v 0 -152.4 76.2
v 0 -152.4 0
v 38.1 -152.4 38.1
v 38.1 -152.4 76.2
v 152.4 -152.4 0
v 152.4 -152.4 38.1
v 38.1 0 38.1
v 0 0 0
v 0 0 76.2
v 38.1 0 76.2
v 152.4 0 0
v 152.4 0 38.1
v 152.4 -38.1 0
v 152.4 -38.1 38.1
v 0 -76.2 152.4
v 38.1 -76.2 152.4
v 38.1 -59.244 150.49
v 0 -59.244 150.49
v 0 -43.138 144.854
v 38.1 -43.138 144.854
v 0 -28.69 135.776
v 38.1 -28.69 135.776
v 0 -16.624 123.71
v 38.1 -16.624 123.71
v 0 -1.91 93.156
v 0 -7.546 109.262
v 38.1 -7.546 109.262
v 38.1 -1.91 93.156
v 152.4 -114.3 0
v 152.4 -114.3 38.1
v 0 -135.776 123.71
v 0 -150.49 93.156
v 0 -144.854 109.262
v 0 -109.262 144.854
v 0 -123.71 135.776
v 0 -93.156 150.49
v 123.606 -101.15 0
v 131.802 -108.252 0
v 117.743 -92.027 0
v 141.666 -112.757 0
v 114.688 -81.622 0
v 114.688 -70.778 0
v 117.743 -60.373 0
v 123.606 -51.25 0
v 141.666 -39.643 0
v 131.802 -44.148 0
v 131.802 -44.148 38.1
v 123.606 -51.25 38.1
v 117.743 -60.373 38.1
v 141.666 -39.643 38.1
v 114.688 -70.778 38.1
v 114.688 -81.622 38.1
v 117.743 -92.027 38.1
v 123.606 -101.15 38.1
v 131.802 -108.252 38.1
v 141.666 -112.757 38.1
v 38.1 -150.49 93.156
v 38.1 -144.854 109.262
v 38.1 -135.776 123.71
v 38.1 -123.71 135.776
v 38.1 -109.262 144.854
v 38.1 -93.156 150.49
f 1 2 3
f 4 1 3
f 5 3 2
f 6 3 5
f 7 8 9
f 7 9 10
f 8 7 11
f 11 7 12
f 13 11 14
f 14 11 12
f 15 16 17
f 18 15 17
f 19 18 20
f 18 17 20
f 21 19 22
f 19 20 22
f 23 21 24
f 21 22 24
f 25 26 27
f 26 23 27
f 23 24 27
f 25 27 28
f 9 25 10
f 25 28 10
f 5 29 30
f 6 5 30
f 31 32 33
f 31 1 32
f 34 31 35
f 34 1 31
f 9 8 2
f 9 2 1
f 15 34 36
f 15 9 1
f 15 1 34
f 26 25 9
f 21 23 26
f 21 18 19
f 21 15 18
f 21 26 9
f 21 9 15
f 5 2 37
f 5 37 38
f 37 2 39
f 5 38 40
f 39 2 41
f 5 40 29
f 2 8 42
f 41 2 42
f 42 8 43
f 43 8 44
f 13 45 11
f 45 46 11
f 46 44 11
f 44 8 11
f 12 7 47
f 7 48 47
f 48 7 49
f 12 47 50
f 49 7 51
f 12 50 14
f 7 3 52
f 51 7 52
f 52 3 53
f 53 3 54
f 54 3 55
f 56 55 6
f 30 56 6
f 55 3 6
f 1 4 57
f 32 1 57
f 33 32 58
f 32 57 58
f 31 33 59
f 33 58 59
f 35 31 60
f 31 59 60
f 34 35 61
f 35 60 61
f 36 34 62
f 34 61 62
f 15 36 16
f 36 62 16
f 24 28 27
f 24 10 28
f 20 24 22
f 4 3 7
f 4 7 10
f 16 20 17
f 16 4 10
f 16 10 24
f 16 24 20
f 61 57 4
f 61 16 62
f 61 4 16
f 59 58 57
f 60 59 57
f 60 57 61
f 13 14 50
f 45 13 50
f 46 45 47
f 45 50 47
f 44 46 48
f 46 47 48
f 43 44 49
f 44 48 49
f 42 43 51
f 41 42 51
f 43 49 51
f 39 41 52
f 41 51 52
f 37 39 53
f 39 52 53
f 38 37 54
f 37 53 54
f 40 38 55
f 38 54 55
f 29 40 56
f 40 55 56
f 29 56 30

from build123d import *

# Parameters (mm, degrees)
F0_W     = 152.4
F0_H     = 152.4
F1_DEPTH = 152.4
F2_W     = 114.3
F2_H     = 114.3
F3_DEPTH = 152.4
F4_R     = 38.1
F5_DEPTH = 76.2
F7_DEPTH = 304.8


with BuildPart() as f1:
    # F0 (on Front) → F1 (new body)
    with BuildSketch(Plane.XZ):
        with Locations((76.2, 76.2)):
            Rectangle(F0_W, F0_H)
    extrude(amount=F1_DEPTH)

    # F2 (on face) → F3 (cut)
    with BuildSketch(Plane.XZ.offset(152.4)):
        with Locations((95.25, 95.25)):
            Rectangle(F2_W, F2_H)
    extrude(amount=-F3_DEPTH, mode=Mode.SUBTRACT)

    # F4 (on face) → F5 (cut)
    with BuildSketch(Plane.XY.offset(38.1)):
        with Locations((152.4, -76.2)):
            Circle(F4_R)
    extrude(amount=-F5_DEPTH, mode=Mode.SUBTRACT)

    # F6 (on face) → F7 (cut)
    with BuildSketch(Plane.YZ.offset(38.1)):
        with BuildLine():
            Line((-76.2, 152.4), (-152.4, 152.4))
            Line((-152.4, 152.4), (-152.4, 76.2))
            ThreePointArc((-152.4, 76.2), (-130.081537, 130.081537), (-76.2, 152.4))
        make_face()
        with BuildLine():
            Line((0, 152.4), (-76.2, 152.4))
            ThreePointArc((-76.2, 152.4), (-22.318463, 130.081537), (0, 76.2))
            Line((0, 76.2), (0, 152.4))
        make_face()
    extrude(amount=-F7_DEPTH, mode=Mode.SUBTRACT)


solid = f1.part
